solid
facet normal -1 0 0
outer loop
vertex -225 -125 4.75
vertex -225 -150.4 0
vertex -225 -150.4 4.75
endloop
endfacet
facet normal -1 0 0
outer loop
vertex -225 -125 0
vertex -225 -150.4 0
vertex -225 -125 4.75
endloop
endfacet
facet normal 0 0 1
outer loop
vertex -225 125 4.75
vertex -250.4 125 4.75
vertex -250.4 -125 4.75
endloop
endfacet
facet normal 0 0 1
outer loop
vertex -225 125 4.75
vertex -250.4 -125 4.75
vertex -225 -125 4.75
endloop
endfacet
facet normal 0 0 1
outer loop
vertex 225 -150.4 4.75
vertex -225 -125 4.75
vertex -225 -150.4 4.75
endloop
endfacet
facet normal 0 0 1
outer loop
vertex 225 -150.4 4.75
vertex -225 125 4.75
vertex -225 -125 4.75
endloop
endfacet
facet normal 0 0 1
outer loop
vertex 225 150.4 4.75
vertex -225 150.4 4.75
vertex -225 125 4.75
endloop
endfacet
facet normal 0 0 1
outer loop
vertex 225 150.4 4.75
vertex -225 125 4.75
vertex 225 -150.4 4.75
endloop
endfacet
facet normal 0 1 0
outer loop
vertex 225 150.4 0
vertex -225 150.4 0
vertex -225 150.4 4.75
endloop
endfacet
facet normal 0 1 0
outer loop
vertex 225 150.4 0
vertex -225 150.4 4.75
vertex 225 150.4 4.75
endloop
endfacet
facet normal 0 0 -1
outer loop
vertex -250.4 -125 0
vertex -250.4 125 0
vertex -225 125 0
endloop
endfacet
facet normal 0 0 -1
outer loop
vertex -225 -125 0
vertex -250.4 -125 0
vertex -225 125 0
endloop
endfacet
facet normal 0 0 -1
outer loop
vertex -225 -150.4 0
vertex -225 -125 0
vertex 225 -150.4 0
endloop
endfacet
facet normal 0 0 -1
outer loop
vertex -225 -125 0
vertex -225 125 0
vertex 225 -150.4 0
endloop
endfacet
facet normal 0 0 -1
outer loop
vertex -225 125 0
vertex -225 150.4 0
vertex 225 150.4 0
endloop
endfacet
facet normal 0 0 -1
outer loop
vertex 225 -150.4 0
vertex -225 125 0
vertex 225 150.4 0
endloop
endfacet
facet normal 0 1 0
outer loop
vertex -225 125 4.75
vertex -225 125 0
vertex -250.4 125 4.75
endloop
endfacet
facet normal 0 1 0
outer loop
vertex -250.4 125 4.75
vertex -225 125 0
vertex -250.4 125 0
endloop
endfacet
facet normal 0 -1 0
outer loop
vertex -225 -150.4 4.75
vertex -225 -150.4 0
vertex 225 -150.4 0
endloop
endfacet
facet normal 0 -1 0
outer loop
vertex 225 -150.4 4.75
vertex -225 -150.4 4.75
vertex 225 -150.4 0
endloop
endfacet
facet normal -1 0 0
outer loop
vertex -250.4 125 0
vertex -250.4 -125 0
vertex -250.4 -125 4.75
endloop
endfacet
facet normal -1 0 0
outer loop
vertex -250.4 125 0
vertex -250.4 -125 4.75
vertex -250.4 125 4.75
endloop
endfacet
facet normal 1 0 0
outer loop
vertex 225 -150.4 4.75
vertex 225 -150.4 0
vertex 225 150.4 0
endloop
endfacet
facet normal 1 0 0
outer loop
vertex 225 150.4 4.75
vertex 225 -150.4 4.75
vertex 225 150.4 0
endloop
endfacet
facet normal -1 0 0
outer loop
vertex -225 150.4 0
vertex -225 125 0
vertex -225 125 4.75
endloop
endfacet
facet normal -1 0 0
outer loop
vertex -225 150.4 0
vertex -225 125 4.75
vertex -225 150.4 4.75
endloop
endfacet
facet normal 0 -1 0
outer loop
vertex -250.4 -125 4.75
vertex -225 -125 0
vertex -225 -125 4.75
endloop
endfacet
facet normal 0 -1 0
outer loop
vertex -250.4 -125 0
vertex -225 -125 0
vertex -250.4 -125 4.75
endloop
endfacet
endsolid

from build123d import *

# Parameters (mm, degrees)
SKETCH_1_W          = 500.8
SKETCH_1_H          = 300.8
EXTRUDE_1_DEPTH     = 4.75
SKETCH_2_W          = 25.4
SKETCH_2_H          = 25.4
CUT_EXTRUDE_1_DEPTH = 10


with BuildPart() as part:
    # 草圖1 → 填料-伸長1 (new body)
    with BuildSketch(Plane.XY):
        Rectangle(SKETCH_1_W, SKETCH_1_H)
    extrude(amount=EXTRUDE_1_DEPTH)

    # 草圖2 → 除料-伸長1 (cut)
    with BuildSketch(Plane(origin=(0, 0, 0), x_dir=(-1, 0, 0), z_dir=(0, 0, -1))):
        Polygon((-250.4, 150.4), (-225, 150.4), (-225, 125), (-225, -125), (-225, -150.4), (-250.4, -150.4), (-250.4, -125), (-250.4, 125), align=None)
        with Locations((237.7, 137.7)):
            Rectangle(SKETCH_2_W, SKETCH_2_H)
        with Locations((237.7, -137.7)):
            Rectangle(SKETCH_2_W, SKETCH_2_H)
    extrude(amount=-CUT_EXTRUDE_1_DEPTH, mode=Mode.SUBTRACT)


solid = part.part
